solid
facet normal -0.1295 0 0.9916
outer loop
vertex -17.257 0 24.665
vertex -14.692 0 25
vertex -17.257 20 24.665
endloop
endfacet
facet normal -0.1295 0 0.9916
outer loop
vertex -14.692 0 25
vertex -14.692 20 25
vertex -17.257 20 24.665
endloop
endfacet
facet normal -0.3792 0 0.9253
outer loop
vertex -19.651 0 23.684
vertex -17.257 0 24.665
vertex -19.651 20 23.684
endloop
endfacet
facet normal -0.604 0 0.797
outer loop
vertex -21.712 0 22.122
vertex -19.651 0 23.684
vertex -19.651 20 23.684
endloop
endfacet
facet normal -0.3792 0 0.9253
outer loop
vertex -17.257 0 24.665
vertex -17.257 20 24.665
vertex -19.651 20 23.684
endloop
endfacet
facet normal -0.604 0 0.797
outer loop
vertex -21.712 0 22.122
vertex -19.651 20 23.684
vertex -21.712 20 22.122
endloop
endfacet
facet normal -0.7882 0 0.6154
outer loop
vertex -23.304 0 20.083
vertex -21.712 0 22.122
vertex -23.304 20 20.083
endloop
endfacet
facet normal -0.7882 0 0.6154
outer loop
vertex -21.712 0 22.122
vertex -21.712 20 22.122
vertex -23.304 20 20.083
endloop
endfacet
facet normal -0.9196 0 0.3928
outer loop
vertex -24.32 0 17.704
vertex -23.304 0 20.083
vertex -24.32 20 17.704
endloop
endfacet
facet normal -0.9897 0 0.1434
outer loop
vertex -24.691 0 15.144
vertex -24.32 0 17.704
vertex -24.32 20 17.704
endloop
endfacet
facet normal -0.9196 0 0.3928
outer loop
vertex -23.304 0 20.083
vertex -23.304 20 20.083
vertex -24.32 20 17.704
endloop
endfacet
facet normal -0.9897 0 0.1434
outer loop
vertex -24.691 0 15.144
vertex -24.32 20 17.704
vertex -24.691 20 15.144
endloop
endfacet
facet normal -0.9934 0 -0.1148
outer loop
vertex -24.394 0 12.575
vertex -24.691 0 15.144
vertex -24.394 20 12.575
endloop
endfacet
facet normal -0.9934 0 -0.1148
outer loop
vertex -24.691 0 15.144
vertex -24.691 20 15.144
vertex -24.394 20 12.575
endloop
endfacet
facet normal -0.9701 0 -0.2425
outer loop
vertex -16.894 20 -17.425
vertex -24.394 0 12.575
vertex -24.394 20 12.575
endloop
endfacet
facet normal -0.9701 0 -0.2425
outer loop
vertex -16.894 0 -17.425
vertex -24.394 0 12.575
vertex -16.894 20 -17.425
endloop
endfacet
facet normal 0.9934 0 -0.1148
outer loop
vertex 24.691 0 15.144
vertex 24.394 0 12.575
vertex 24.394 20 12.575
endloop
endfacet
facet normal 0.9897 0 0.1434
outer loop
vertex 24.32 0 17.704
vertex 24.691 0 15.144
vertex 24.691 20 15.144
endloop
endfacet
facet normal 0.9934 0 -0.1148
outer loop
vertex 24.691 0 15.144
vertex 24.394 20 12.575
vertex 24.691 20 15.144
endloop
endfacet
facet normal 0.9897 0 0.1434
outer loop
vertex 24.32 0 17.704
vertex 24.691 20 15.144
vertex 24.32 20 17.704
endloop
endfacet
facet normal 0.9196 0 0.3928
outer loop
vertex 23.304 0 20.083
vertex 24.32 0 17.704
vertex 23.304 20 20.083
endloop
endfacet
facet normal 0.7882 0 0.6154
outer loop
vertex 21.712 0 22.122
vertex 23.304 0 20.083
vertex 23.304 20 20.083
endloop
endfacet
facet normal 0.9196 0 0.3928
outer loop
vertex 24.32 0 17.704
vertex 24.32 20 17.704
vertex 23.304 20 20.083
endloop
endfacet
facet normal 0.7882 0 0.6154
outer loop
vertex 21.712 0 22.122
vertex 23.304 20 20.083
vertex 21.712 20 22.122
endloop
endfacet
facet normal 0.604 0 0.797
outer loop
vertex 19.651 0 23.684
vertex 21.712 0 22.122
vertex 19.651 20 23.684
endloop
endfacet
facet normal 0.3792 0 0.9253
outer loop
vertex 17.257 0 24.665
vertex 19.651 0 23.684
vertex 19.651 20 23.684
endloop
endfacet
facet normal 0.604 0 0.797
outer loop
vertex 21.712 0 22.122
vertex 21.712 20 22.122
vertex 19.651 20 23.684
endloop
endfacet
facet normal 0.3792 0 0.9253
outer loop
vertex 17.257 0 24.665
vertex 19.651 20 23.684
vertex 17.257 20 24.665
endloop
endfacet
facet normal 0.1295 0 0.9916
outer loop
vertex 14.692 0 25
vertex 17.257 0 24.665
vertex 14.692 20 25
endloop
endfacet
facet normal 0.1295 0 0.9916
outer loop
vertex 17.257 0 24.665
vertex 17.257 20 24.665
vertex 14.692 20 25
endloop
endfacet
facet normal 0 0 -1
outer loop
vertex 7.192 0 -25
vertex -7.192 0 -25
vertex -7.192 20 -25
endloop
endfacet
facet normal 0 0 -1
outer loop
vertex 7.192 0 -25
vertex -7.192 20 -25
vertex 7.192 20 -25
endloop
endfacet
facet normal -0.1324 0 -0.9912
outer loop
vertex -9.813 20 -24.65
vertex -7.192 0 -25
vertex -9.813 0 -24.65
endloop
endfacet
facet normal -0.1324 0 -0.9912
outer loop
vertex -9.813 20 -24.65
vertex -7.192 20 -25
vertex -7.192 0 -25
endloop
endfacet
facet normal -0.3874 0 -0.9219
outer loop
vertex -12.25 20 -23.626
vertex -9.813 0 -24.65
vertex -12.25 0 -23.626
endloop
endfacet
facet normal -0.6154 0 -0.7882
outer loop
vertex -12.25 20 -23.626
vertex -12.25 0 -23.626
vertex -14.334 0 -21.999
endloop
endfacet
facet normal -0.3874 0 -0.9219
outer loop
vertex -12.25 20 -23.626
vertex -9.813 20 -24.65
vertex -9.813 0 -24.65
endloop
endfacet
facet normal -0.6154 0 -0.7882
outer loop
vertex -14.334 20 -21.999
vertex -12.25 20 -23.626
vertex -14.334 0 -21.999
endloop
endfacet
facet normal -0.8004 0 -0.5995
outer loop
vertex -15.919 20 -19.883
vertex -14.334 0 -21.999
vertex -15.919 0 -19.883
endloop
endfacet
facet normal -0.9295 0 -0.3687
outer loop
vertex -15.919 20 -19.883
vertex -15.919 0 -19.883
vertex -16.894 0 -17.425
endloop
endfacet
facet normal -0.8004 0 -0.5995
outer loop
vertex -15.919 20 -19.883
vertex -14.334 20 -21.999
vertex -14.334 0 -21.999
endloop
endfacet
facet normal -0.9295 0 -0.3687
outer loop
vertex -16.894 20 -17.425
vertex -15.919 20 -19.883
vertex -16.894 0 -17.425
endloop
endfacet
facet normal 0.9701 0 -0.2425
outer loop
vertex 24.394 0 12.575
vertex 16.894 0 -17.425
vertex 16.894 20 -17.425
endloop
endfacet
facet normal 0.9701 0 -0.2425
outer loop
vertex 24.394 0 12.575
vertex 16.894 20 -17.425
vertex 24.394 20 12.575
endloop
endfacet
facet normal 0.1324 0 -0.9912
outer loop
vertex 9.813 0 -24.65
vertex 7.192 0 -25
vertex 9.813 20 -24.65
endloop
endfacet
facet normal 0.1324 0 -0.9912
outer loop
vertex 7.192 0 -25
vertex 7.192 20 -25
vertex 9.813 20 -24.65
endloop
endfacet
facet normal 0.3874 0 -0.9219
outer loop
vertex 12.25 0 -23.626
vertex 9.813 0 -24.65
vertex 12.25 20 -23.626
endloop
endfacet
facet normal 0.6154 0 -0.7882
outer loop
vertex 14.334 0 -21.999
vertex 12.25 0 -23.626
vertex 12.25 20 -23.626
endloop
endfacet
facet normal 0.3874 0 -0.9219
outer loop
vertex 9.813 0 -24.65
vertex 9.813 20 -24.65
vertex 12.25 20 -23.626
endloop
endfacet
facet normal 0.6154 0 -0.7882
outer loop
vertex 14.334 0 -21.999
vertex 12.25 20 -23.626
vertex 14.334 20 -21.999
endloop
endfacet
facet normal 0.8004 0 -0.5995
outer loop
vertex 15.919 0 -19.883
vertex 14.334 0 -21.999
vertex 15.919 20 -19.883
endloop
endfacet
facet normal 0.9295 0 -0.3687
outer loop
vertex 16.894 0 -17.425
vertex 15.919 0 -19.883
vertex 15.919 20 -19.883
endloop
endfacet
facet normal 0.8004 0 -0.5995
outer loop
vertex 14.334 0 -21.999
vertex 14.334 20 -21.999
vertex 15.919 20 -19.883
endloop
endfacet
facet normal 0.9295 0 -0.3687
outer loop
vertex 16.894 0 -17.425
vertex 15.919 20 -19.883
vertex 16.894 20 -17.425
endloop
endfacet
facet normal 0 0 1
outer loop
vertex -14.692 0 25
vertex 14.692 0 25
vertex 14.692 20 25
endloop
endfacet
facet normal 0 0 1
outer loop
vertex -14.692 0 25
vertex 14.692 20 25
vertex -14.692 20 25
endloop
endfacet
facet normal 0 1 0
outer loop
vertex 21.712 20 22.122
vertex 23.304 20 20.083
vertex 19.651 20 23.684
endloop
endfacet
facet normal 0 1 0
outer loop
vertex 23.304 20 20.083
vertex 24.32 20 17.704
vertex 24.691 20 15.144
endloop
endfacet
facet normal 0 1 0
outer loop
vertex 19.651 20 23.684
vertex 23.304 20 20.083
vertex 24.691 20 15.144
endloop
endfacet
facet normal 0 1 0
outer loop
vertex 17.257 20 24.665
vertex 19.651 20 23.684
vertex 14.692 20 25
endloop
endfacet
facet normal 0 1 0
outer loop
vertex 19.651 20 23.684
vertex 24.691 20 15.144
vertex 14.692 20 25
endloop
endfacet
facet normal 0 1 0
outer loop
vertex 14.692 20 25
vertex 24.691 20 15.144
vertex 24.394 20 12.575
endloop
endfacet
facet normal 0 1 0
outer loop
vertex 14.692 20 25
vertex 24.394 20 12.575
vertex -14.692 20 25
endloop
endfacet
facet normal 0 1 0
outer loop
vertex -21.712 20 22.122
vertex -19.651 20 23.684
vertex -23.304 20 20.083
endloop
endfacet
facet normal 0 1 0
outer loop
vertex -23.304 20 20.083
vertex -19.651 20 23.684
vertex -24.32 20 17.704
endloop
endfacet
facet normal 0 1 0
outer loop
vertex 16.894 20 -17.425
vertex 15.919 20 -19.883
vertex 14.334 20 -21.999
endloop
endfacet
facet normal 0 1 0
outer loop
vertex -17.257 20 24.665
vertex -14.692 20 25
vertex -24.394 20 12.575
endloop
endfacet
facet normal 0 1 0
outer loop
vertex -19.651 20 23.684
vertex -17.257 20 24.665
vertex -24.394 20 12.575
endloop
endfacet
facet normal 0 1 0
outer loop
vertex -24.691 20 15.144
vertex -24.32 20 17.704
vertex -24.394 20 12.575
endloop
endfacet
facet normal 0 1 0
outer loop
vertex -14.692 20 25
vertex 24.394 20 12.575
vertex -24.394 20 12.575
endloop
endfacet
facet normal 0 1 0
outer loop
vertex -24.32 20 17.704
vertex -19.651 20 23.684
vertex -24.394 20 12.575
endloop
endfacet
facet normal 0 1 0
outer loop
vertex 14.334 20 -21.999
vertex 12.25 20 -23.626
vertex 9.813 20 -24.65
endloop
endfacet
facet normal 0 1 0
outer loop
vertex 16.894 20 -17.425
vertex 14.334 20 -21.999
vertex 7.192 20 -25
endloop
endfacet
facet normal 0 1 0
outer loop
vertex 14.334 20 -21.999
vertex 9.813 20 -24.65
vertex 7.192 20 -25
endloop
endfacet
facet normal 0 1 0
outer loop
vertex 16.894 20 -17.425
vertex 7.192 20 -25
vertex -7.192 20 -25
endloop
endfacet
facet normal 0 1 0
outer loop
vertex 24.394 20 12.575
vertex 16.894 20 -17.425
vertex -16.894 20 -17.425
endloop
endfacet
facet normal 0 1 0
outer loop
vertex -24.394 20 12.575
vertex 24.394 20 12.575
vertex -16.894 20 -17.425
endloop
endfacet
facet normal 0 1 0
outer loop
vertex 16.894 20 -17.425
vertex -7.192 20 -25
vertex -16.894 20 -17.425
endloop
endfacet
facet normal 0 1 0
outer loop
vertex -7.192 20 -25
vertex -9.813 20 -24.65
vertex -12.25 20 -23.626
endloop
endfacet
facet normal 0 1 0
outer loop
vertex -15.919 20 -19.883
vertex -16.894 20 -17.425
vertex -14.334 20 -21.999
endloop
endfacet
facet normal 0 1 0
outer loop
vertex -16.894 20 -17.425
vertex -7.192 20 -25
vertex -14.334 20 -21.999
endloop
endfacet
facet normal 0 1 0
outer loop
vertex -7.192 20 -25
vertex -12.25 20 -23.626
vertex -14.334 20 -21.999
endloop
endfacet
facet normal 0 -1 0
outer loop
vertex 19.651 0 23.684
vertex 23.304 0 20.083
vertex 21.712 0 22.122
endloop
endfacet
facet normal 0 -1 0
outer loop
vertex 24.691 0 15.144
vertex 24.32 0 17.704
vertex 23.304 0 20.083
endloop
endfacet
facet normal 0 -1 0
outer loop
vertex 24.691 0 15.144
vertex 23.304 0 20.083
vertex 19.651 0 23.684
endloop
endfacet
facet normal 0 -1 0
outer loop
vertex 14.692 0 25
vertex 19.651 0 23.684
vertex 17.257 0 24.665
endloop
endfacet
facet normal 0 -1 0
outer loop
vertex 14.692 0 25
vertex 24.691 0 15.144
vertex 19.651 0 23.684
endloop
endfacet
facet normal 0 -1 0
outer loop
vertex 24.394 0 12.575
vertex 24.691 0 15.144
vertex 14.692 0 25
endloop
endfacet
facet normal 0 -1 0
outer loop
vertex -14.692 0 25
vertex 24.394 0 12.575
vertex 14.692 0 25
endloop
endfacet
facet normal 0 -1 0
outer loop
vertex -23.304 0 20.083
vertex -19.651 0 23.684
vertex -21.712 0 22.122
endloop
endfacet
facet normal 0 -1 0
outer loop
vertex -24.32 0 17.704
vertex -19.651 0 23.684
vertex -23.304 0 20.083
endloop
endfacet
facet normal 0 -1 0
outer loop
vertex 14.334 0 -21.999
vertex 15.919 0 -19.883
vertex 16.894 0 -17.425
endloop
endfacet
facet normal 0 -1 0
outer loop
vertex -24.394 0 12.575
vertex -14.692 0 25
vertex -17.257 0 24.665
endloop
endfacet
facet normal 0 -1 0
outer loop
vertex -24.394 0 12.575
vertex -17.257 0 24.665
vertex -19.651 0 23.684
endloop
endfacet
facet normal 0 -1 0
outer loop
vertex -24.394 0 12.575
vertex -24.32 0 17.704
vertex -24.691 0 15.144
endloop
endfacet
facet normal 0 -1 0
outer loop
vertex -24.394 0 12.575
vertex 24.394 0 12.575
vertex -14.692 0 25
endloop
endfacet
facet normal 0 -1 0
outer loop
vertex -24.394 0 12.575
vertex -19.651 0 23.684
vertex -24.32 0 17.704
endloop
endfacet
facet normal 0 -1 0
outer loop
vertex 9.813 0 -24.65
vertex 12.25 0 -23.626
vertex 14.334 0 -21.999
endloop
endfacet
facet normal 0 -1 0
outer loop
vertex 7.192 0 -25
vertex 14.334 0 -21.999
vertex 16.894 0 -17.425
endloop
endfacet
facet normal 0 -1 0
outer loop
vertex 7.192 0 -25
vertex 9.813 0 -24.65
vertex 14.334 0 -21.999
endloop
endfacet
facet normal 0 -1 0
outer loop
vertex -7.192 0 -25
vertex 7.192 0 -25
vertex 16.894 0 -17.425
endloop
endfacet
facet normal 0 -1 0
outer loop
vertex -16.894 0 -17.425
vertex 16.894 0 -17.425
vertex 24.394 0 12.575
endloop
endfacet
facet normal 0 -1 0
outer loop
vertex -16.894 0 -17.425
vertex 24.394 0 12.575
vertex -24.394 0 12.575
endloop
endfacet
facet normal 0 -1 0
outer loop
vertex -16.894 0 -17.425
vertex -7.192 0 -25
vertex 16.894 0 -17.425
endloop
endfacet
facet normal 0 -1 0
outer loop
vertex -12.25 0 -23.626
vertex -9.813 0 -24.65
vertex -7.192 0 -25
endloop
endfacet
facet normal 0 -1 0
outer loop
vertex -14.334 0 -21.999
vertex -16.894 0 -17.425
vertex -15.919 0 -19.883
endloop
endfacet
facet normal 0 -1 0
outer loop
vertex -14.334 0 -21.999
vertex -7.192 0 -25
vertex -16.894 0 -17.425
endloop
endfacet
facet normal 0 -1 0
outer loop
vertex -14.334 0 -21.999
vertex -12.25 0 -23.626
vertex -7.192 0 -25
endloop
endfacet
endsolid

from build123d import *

# Parameters (mm, degrees)
FSHAPE1_DEPTH = 20
FRSHAPE1_R    = 10


with BuildPart() as part:
    # SShape1 → FShape1 (new body)
    with BuildSketch(Plane(origin=(0, 0, 0), x_dir=(1, 0, 0), z_dir=(0, 1, 0))):
        Polygon((-15, 25), (15, 25), (27.5, -25), (-27.5, -25), align=None)
    extrude(amount=FSHAPE1_DEPTH)

    # FRShape1
    frshape1_edges = [part.edges().sort_by_distance(p)[0] for p in [
        (-15, 10, -25),
        (15, 10, -25),
        (27.5, 10, 25),
        (-27.5, 10, 25),
    ]]
    fillet(frshape1_edges, radius=FRSHAPE1_R)


solid = part.part
